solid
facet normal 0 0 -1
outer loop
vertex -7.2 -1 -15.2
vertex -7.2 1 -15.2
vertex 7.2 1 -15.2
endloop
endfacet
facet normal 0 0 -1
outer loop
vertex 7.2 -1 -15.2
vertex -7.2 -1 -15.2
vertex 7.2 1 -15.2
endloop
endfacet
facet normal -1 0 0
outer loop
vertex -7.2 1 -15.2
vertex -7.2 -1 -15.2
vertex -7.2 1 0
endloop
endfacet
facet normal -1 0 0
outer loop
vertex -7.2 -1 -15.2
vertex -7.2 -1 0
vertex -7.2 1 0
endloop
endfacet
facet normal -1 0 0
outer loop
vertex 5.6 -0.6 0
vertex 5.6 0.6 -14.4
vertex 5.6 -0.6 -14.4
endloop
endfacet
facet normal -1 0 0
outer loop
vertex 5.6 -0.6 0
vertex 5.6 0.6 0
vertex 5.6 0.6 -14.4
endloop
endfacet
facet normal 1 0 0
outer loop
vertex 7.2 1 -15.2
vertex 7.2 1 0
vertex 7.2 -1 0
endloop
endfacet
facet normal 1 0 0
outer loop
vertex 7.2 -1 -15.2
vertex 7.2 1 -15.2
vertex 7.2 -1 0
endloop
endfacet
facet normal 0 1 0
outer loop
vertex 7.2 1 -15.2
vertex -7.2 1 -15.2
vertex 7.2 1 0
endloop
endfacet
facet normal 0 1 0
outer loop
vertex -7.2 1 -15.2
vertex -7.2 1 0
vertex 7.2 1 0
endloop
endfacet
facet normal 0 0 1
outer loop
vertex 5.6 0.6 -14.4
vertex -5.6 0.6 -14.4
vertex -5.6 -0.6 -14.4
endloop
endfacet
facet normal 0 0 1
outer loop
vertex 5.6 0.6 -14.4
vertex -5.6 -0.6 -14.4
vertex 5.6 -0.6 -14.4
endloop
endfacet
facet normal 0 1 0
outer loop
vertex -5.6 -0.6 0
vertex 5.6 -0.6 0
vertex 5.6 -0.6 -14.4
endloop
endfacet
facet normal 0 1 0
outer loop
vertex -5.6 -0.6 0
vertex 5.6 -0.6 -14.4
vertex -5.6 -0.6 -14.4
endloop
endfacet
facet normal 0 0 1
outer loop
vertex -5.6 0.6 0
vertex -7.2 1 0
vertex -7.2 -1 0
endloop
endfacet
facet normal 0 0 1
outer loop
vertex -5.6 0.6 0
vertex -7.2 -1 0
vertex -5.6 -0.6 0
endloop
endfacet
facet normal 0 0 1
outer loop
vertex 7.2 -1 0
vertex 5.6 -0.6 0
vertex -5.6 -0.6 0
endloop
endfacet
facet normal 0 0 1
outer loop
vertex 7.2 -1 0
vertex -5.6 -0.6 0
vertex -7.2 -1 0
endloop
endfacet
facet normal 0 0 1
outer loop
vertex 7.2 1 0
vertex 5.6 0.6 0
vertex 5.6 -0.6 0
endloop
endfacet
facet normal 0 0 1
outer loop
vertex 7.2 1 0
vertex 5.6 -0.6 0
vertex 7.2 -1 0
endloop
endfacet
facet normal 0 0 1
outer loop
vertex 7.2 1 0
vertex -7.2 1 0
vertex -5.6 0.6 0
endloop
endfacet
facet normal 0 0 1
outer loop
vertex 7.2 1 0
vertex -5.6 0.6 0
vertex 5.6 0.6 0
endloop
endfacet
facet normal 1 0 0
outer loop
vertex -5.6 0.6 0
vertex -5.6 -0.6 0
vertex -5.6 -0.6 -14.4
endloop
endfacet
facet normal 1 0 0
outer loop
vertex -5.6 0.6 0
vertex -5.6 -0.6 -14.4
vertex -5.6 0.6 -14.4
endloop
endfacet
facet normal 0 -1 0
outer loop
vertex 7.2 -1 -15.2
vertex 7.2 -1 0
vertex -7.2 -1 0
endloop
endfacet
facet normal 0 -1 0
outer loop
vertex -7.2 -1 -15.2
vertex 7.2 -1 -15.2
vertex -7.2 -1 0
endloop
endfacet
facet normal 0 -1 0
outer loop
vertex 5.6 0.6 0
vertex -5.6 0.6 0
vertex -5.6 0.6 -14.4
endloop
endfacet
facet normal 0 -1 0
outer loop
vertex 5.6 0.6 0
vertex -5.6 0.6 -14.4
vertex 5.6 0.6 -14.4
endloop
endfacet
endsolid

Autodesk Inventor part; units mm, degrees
ref_plane "YZ Plane" through (0, 0, 0) normal (1, 0, 0) x (0, 1, 0)
ref_plane "XZ Plane" through (0, 0, 0) normal (0, 1, 0) x (-1, 0, 0)
ref_plane "XY Plane" through (0, 0, 0) normal (0, 0, 1) x (1, 0, 0)
sketch "Sketch2" plane through (0, 0, 0) normal (0, 0, 1) x (1, 0, 0)
  line L0 (-7.2, 1) -> (7.2, 1)
  line L1 (7.2, 1) -> (7.2, -1)
  line L2 (7.2, -1) -> (-7.2, -1)
  line L3 (-7.2, -1) -> (-7.2, 1)
  line L4 (-5.6, 0.6) -> (5.6, 0.6)
  line L5 (5.6, 0.6) -> (5.6, -0.6)
  line L6 (5.6, -0.6) -> (-5.6, -0.6)
  line L7 (-5.6, -0.6) -> (-5.6, 0.6)
  point P0 (0, 0)
  point P1 (-7.2, 0)
  point P2 (0, -1)
  point P3 (0, 0.6)
  point P4 (-5.6, 0)
  dimension "d0" = 2
  dimension "d1" = 14.4
  dimension "d2" = 1.2
  dimension "d3" = 11.2
extrude "Extrusion1" add sketch "Sketch2" against normal blind 15.2 contours L0 L1 L2 L3 | L4 L5 L6 L7
extrude "Extrusion2" cut sketch "Sketch2" against normal blind 14.4 contours L4 L5 L6 L7
properties part number "11034-Black" material "ABS Plastic"
